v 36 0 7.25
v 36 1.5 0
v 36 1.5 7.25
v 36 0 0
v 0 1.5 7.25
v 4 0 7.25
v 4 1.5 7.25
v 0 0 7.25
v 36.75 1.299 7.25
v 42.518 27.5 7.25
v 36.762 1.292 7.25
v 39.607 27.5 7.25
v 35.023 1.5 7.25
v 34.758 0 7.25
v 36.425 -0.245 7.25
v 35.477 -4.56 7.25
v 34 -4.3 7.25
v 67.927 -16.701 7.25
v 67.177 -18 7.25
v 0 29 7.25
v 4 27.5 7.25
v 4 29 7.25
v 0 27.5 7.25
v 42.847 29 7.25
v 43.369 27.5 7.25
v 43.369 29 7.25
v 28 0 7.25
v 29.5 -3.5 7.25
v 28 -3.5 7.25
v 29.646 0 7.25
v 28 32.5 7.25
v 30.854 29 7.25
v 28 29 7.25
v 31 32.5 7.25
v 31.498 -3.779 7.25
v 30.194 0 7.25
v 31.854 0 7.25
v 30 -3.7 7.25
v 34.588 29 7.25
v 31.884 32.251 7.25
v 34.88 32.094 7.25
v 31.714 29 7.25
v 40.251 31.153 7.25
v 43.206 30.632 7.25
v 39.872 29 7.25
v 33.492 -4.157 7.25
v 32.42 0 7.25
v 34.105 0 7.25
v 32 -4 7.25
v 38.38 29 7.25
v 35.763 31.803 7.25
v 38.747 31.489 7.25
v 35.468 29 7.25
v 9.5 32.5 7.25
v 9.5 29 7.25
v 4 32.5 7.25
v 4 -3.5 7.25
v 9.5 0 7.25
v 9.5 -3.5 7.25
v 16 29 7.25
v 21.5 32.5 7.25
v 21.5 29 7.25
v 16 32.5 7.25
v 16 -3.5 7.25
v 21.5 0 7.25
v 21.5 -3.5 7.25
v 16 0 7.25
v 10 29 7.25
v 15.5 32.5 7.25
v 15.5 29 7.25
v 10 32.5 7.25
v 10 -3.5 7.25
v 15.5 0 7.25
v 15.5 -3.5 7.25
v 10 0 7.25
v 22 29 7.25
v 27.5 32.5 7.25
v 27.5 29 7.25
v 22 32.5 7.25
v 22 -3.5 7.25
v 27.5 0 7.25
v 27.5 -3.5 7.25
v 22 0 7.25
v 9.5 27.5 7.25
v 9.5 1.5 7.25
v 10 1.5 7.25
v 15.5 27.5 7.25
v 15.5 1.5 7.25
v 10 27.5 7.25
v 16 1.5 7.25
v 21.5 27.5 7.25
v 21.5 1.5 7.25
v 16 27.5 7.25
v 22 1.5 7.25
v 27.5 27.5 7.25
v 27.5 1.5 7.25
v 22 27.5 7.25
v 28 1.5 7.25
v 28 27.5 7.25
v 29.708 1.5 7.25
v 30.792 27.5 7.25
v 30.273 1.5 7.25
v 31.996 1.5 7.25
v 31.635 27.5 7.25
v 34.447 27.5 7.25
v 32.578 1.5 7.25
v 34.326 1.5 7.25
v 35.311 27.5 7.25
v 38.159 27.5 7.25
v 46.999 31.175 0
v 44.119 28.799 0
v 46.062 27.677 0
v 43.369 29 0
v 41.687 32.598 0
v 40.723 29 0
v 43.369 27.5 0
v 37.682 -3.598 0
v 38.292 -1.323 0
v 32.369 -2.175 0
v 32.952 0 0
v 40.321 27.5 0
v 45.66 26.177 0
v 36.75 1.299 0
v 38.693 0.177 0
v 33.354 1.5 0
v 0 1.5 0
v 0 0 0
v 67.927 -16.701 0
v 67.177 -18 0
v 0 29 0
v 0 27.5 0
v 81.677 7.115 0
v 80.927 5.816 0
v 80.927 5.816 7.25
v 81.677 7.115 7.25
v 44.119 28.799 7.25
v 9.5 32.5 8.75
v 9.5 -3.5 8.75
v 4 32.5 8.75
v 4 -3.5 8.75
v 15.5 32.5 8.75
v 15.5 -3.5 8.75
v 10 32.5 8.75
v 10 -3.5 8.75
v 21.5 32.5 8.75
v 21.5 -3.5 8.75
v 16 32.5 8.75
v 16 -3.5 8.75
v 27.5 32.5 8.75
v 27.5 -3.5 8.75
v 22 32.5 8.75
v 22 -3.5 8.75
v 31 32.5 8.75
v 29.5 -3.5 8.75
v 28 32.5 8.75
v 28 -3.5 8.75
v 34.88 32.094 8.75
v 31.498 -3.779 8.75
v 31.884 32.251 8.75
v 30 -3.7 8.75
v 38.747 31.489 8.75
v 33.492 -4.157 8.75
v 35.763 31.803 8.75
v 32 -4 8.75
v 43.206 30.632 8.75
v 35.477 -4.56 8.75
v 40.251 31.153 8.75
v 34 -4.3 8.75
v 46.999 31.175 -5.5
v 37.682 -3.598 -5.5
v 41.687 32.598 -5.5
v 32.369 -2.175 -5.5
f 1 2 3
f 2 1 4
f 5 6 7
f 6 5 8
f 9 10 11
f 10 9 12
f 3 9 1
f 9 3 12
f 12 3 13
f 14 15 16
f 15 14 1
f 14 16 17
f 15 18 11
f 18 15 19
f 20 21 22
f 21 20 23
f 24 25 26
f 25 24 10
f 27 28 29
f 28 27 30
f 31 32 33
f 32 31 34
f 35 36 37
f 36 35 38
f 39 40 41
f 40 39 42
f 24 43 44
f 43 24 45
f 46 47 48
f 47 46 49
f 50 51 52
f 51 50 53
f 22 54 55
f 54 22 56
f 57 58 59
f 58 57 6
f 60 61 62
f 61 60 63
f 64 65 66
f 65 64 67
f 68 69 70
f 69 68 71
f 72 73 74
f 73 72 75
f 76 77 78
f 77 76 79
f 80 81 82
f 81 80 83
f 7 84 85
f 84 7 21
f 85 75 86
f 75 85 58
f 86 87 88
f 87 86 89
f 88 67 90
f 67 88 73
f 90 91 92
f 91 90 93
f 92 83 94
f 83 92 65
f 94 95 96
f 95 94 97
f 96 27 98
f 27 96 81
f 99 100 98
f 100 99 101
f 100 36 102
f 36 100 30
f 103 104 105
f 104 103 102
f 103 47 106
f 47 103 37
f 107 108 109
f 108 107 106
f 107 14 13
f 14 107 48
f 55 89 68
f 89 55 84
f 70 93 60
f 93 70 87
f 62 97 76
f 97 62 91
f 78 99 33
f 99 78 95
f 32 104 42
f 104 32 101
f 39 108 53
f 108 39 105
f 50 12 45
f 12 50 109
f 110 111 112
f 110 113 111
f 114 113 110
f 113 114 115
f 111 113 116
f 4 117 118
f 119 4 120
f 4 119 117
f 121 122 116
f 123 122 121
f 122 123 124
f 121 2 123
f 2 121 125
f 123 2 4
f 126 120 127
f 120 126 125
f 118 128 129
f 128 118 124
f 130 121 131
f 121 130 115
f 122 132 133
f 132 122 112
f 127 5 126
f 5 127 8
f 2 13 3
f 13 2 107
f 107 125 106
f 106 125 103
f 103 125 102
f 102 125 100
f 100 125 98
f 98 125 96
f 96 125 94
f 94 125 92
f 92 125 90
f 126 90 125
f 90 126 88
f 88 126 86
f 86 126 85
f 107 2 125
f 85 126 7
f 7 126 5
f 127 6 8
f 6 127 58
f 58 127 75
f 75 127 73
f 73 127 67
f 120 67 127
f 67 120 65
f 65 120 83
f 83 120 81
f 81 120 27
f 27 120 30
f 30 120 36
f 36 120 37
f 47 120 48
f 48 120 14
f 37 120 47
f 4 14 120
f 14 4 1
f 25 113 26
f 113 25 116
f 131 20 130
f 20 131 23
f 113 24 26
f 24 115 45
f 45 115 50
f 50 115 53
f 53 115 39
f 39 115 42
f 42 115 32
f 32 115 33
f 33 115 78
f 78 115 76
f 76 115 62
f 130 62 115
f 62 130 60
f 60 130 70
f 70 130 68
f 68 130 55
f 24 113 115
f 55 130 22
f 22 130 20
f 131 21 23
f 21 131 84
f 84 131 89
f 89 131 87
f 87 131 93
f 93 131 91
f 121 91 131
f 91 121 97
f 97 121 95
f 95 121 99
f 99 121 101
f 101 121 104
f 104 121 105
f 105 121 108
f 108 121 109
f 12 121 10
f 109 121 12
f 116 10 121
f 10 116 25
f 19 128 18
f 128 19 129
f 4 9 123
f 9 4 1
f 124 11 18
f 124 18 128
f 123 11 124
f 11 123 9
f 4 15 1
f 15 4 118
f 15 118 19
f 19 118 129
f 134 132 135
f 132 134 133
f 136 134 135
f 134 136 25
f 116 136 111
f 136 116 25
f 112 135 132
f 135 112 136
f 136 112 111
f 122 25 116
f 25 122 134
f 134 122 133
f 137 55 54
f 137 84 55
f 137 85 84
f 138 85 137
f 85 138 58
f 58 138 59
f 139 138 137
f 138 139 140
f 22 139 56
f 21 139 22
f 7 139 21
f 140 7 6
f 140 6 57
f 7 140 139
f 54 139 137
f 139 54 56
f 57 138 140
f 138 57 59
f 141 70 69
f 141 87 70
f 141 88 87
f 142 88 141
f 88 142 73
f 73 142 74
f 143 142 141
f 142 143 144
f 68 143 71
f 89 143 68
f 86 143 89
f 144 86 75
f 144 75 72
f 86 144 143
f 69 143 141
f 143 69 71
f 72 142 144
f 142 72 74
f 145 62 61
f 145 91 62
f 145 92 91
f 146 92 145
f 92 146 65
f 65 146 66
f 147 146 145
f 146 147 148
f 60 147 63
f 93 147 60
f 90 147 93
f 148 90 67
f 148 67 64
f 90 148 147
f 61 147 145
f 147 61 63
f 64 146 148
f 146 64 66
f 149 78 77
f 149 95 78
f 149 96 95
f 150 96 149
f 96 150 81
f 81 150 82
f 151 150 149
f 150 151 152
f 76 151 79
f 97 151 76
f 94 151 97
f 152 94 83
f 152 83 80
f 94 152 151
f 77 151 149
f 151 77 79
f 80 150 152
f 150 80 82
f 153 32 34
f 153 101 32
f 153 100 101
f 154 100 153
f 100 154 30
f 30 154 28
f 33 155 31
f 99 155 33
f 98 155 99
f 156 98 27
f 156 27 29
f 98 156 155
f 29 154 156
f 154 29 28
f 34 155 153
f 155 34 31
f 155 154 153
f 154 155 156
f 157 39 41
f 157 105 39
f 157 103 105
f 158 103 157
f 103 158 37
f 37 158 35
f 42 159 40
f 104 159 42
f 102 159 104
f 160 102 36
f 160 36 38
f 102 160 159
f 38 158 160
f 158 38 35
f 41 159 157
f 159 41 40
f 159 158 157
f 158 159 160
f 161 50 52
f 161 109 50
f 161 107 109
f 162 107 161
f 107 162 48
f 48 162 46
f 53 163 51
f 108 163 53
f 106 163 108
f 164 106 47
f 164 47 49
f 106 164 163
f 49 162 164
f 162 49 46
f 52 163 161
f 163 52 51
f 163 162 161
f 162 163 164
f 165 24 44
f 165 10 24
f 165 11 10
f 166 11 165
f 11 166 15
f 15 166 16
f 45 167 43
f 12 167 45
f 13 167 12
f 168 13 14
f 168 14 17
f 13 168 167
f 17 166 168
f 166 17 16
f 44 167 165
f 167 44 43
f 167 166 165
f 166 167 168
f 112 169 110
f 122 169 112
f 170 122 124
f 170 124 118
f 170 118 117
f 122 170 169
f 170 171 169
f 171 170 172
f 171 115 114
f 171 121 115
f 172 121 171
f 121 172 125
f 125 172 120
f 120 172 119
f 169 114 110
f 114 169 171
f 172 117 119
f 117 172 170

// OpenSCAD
// FUNCTIONS:

function hypotenuse(x,y) = sqrt ( x*x + y*y );

// PARAMETERS:

// All distances are in inches.
//
tread_width = 3*12;
    // Tread width.
stringer_space = 27.5;
    // Distance between stringer centers.
tapered_long = 3;
tapered_short = 1.5;

angle = 30; // Degrees

// Stringers are 2x8's.  Sill is 6x6.

stringer_short_length = 3*12;
stringer_long_length = stringer_short_length
                     + stringer_space * tan ( angle / 2 );
sill_center = ( stringer_short_length
                +
		stringer_long_length )
	    / 2;

// COMPONENTS:

module tread()
{
    color ("SandyBrown")
    translate ( [0,-3.5,7.25] )
    cube ([5.5,tread_width,1.5]);
}
module tapered(angle,displacement)
{
    color ("SandyBrown")
    translate ( [0,-3.5 - displacement,7.25] )
    rotate ( [0,0,- angle] )
    linear_extrude ( 1.5 )
    {
	polygon ( [ [0,0], [0,tread_width,],
		    [tapered_long,tread_width],
		    [tapered_short,0] ] );
    }
}
module stringer( length )
{
    color ("Chocolate")
        cube ([length,1.5,7.25]);
}
module sill()
{
    color ("LightGray")
        cube ([5.5,tread_width,5.5]);
}

// ASSEMBLIES:

module treads()
{
    for (dx = [0:6:18]) {
        translate ([4 + dx,0,0]) tread();
    }
    translate ([28,0,0]) tapered(0,0);
    translate ([30,0,0]) tapered(3,0.2);
    translate ([32,0,0]) tapered(6,0.5);
    translate ([34,0,0]) tapered(10,0.8);
}
module stringers()
{
    stringer ( stringer_short_length );
    translate ( [0, stringer_space, 0] )
        stringer ( stringer_long_length );

    translate ( [stringer_short_length, 0, 0] )
    rotate ( [0, 0, - angle] )
    stringer ( stringer_short_length );

    translate ( [stringer_long_length, stringer_space, 0] )
    rotate ( [0, 0, - angle] )
    stringer ( stringer_long_length );

}
module sills() {
    translate ([sill_center,0.75 + stringer_space / 2,0])
    rotate ( [0, 0, - angle / 2] )
    translate ( [ -5.5 / 2, - tread_width / 2, - 5.5] )
    sill();
}

stringers();
sills();
treads();
